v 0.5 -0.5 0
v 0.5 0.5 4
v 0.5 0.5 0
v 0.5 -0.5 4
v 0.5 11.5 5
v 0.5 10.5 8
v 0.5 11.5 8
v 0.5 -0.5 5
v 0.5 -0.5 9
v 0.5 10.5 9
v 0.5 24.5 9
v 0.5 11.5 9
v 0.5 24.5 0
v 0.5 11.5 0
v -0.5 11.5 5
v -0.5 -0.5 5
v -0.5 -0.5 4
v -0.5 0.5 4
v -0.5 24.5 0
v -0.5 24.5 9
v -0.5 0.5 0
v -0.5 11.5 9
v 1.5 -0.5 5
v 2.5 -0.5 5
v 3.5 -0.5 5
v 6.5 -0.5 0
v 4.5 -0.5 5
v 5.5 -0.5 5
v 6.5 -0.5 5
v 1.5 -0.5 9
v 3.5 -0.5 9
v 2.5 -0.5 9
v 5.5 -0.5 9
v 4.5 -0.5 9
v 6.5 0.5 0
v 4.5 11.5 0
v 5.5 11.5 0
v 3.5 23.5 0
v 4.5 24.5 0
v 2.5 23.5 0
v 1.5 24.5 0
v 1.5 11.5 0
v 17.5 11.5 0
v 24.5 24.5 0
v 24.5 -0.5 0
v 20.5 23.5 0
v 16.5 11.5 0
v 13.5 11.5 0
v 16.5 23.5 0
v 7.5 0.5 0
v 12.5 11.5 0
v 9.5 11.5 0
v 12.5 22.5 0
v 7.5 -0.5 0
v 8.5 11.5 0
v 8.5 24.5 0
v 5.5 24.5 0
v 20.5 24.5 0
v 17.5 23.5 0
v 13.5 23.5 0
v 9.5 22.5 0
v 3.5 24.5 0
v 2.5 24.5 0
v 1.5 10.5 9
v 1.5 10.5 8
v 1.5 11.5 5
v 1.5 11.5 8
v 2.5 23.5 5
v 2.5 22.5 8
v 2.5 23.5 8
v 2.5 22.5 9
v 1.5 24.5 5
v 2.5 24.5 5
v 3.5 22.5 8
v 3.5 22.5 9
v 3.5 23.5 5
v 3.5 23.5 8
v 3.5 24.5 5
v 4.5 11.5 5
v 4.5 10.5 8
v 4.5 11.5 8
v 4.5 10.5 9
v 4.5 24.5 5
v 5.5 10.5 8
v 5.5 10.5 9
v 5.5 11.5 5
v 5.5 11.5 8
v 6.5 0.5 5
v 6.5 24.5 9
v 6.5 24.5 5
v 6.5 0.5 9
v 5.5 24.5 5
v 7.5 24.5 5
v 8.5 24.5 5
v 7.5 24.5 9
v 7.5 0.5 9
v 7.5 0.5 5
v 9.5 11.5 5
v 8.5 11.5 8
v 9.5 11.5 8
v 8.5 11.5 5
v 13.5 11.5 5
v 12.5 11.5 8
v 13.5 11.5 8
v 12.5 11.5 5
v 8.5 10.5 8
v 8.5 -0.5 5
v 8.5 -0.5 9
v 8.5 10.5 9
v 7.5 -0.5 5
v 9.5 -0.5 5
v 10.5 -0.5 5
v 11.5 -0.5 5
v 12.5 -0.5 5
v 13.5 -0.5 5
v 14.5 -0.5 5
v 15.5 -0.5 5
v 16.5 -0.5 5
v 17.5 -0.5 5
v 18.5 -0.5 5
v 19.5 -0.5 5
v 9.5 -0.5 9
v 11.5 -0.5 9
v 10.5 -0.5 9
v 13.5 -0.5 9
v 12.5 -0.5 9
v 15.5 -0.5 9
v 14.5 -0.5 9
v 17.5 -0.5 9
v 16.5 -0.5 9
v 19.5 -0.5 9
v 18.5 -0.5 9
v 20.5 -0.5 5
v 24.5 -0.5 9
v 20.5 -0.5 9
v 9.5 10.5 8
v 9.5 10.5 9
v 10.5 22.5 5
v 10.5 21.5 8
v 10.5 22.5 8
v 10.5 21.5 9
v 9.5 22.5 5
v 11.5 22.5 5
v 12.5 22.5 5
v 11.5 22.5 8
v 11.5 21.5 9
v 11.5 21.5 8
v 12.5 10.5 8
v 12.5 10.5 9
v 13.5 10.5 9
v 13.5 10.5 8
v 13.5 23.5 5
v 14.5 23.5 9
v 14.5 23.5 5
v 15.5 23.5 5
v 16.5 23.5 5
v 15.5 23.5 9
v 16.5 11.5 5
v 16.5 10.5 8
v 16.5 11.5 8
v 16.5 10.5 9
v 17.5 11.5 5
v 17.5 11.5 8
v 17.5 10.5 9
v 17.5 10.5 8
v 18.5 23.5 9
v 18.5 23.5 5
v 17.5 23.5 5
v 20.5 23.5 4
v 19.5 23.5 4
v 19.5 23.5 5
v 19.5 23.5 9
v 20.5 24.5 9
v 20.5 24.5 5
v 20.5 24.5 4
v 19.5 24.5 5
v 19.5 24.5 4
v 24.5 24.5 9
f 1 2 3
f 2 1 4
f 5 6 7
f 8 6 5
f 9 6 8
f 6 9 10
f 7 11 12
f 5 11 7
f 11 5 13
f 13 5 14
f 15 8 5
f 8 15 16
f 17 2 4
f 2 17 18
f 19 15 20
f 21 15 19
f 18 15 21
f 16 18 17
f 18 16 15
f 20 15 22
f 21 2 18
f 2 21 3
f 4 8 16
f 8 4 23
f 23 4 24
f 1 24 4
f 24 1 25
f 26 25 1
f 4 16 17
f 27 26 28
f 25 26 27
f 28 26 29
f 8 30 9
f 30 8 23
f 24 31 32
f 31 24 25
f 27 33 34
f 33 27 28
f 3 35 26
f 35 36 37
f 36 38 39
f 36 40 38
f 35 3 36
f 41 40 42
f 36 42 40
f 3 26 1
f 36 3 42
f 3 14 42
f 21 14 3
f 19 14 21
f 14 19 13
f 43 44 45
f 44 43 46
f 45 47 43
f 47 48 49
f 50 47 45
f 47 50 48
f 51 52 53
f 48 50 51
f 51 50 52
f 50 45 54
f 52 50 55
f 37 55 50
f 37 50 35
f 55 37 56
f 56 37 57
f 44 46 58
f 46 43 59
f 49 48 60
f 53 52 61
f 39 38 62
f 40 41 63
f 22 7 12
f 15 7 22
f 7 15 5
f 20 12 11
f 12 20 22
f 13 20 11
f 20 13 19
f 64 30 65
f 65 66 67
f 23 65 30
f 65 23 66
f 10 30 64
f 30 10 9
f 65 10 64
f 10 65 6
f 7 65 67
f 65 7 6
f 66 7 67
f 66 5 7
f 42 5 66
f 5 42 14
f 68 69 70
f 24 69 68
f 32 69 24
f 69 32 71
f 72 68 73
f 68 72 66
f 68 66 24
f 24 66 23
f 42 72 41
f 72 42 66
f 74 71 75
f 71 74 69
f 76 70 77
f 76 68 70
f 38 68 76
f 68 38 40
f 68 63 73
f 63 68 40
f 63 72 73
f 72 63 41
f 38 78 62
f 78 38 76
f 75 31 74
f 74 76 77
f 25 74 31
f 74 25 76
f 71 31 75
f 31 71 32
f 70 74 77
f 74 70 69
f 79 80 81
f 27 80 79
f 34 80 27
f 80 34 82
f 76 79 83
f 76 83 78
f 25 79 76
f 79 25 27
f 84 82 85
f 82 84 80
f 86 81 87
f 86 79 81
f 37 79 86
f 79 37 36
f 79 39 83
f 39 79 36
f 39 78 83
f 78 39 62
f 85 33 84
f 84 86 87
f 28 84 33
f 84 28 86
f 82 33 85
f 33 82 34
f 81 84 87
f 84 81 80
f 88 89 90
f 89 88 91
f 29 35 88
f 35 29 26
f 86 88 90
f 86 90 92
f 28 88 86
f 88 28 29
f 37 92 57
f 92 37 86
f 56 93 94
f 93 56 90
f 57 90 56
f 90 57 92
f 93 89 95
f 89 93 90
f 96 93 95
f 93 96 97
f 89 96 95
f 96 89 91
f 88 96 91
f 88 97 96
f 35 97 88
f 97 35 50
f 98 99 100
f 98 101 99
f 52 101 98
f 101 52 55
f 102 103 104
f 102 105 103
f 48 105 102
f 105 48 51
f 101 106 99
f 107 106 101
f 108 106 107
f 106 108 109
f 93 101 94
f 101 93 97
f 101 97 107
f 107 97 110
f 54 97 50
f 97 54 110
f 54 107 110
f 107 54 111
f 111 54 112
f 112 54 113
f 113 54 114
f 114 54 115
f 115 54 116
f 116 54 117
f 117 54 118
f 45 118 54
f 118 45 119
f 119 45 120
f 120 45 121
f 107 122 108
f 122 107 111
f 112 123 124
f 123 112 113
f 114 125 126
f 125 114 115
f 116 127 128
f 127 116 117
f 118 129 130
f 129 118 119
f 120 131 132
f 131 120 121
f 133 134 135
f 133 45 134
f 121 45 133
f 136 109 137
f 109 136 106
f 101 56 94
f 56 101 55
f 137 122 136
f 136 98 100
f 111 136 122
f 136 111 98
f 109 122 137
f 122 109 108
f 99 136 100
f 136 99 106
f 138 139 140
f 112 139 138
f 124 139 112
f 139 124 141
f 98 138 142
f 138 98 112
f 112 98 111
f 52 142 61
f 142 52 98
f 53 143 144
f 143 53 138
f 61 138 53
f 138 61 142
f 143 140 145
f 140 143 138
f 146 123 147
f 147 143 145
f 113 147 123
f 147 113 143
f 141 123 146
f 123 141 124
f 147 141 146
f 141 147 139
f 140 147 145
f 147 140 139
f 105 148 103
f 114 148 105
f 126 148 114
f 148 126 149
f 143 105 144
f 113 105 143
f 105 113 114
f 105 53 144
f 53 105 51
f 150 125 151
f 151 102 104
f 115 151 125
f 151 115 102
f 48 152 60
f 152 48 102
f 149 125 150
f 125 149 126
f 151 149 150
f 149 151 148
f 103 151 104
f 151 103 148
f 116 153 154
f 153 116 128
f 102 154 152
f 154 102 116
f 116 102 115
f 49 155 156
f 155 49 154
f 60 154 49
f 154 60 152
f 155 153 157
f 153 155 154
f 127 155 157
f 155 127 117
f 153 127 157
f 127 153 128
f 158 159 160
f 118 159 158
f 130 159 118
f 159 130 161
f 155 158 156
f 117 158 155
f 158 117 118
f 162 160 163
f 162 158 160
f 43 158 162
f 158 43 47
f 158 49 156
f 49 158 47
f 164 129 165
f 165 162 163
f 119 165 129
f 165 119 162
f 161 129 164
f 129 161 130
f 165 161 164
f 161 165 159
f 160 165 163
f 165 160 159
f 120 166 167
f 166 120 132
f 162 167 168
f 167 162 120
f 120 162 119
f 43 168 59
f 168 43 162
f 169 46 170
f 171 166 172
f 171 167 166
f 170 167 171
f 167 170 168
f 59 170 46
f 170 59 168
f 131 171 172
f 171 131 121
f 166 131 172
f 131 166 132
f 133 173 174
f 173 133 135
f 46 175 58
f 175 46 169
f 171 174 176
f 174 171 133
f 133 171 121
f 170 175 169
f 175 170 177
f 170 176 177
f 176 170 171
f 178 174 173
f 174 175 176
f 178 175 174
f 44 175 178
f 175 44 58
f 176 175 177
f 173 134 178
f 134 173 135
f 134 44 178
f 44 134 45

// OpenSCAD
union() {
    translate([0, 0, 4.5]) color([1, 0, 0]) cube([1, 1, 1], center=true);
    translate([0, 1, 2.5]) cube([1, 1, 5], center=true);
    translate([0, 2, 2.5]) cube([1, 1, 5], center=true);
    translate([0, 3, 2.5]) cube([1, 1, 5], center=true);
    translate([0, 4, 2.5]) cube([1, 1, 5], center=true);
    translate([0, 5, 2.5]) cube([1, 1, 5], center=true);
    translate([0, 6, 2.5]) cube([1, 1, 5], center=true);
    translate([0, 7, 2.5]) cube([1, 1, 5], center=true);
    translate([0, 8, 2.5]) cube([1, 1, 5], center=true);
    translate([0, 9, 2.5]) cube([1, 1, 5], center=true);
    translate([0, 10, 2.5]) cube([1, 1, 5], center=true);
    translate([0, 11, 2.5]) cube([1, 1, 5], center=true);
    translate([0, 12, 4.5]) cube([1, 1, 9], center=true);
    translate([0, 13, 4.5]) cube([1, 1, 9], center=true);
    translate([0, 14, 4.5]) cube([1, 1, 9], center=true);
    translate([0, 15, 4.5]) cube([1, 1, 9], center=true);
    translate([0, 16, 4.5]) cube([1, 1, 9], center=true);
    translate([0, 17, 4.5]) cube([1, 1, 9], center=true);
    translate([0, 18, 4.5]) cube([1, 1, 9], center=true);
    translate([0, 19, 4.5]) cube([1, 1, 9], center=true);
    translate([0, 20, 4.5]) cube([1, 1, 9], center=true);
    translate([0, 21, 4.5]) cube([1, 1, 9], center=true);
    translate([0, 22, 4.5]) cube([1, 1, 9], center=true);
    translate([0, 23, 4.5]) cube([1, 1, 9], center=true);
    translate([0, 24, 4.5]) cube([1, 1, 9], center=true);
    translate([1, 0, 4.5]) cube([1, 1, 9], center=true);
    translate([1, 1, 4.5]) cube([1, 1, 9], center=true);
    translate([1, 2, 4.5]) cube([1, 1, 9], center=true);
    translate([1, 3, 4.5]) cube([1, 1, 9], center=true);
    translate([1, 4, 4.5]) cube([1, 1, 9], center=true);
    translate([1, 5, 4.5]) cube([1, 1, 9], center=true);
    translate([1, 6, 4.5]) cube([1, 1, 9], center=true);
    translate([1, 7, 4.5]) cube([1, 1, 9], center=true);
    translate([1, 8, 4.5]) cube([1, 1, 9], center=true);
    translate([1, 9, 4.5]) cube([1, 1, 9], center=true);
    translate([1, 10, 4.5]) cube([1, 1, 9], center=true);
    translate([1, 11, 4.0]) cube([1, 1, 8], center=true);
    translate([2, 0, 2.5]) cube([1, 1, 5], center=true);
    translate([2, 1, 2.5]) cube([1, 1, 5], center=true);
    translate([2, 2, 2.5]) cube([1, 1, 5], center=true);
    translate([2, 3, 2.5]) cube([1, 1, 5], center=true);
    translate([2, 4, 2.5]) cube([1, 1, 5], center=true);
    translate([2, 5, 2.5]) cube([1, 1, 5], center=true);
    translate([2, 6, 2.5]) cube([1, 1, 5], center=true);
    translate([2, 7, 2.5]) cube([1, 1, 5], center=true);
    translate([2, 8, 2.5]) cube([1, 1, 5], center=true);
    translate([2, 9, 2.5]) cube([1, 1, 5], center=true);
    translate([2, 10, 2.5]) cube([1, 1, 5], center=true);
    translate([2, 11, 2.5]) cube([1, 1, 5], center=true);
    translate([2, 12, 2.5]) cube([1, 1, 5], center=true);
    translate([2, 13, 2.5]) cube([1, 1, 5], center=true);
    translate([2, 14, 2.5]) cube([1, 1, 5], center=true);
    translate([2, 15, 2.5]) cube([1, 1, 5], center=true);
    translate([2, 16, 2.5]) cube([1, 1, 5], center=true);
    translate([2, 17, 2.5]) cube([1, 1, 5], center=true);
    translate([2, 18, 2.5]) cube([1, 1, 5], center=true);
    translate([2, 19, 2.5]) cube([1, 1, 5], center=true);
    translate([2, 20, 2.5]) cube([1, 1, 5], center=true);
    translate([2, 21, 2.5]) cube([1, 1, 5], center=true);
    translate([2, 22, 2.5]) cube([1, 1, 5], center=true);
    translate([2, 23, 2.5]) cube([1, 1, 5], center=true);
    translate([2, 24, 2.5]) cube([1, 1, 5], center=true);
    translate([3, 0, 4.5]) cube([1, 1, 9], center=true);
    translate([3, 1, 4.5]) cube([1, 1, 9], center=true);
    translate([3, 2, 4.5]) cube([1, 1, 9], center=true);
    translate([3, 3, 4.5]) cube([1, 1, 9], center=true);
    translate([3, 4, 4.5]) cube([1, 1, 9], center=true);
    translate([3, 5, 4.5]) cube([1, 1, 9], center=true);
    translate([3, 6, 4.5]) cube([1, 1, 9], center=true);
    translate([3, 7, 4.5]) cube([1, 1, 9], center=true);
    translate([3, 8, 4.5]) cube([1, 1, 9], center=true);
    translate([3, 9, 4.5]) cube([1, 1, 9], center=true);
    translate([3, 10, 4.5]) cube([1, 1, 9], center=true);
    translate([3, 11, 4.5]) cube([1, 1, 9], center=true);
    translate([3, 12, 4.5]) cube([1, 1, 9], center=true);
    translate([3, 13, 4.5]) cube([1, 1, 9], center=true);
    translate([3, 14, 4.5]) cube([1, 1, 9], center=true);
    translate([3, 15, 4.5]) cube([1, 1, 9], center=true);
    translate([3, 16, 4.5]) cube([1, 1, 9], center=true);
    translate([3, 17, 4.5]) cube([1, 1, 9], center=true);
    translate([3, 18, 4.5]) cube([1, 1, 9], center=true);
    translate([3, 19, 4.5]) cube([1, 1, 9], center=true);
    translate([3, 20, 4.5]) cube([1, 1, 9], center=true);
    translate([3, 21, 4.5]) cube([1, 1, 9], center=true);
    translate([3, 22, 4.5]) cube([1, 1, 9], center=true);
    translate([3, 23, 4.0]) cube([1, 1, 8], center=true);
    translate([4, 0, 2.5]) cube([1, 1, 5], center=true);
    translate([4, 1, 2.5]) cube([1, 1, 5], center=true);
    translate([4, 2, 2.5]) cube([1, 1, 5], center=true);
    translate([4, 3, 2.5]) cube([1, 1, 5], center=true);
    translate([4, 4, 2.5]) cube([1, 1, 5], center=true);
    translate([4, 5, 2.5]) cube([1, 1, 5], center=true);
    translate([4, 6, 2.5]) cube([1, 1, 5], center=true);
    translate([4, 7, 2.5]) cube([1, 1, 5], center=true);
    translate([4, 8, 2.5]) cube([1, 1, 5], center=true);
    translate([4, 9, 2.5]) cube([1, 1, 5], center=true);
    translate([4, 10, 2.5]) cube([1, 1, 5], center=true);
    translate([4, 11, 2.5]) cube([1, 1, 5], center=true);
    translate([4, 12, 2.5]) cube([1, 1, 5], center=true);
    translate([4, 13, 2.5]) cube([1, 1, 5], center=true);
    translate([4, 14, 2.5]) cube([1, 1, 5], center=true);
    translate([4, 15, 2.5]) cube([1, 1, 5], center=true);
    translate([4, 16, 2.5]) cube([1, 1, 5], center=true);
    translate([4, 17, 2.5]) cube([1, 1, 5], center=true);
    translate([4, 18, 2.5]) cube([1, 1, 5], center=true);
    translate([4, 19, 2.5]) cube([1, 1, 5], center=true);
    translate([4, 20, 2.5]) cube([1, 1, 5], center=true);
    translate([4, 21, 2.5]) cube([1, 1, 5], center=true);
    translate([4, 22, 2.5]) cube([1, 1, 5], center=true);
    translate([4, 23, 2.5]) cube([1, 1, 5], center=true);
    translate([4, 24, 2.5]) cube([1, 1, 5], center=true);
    translate([5, 0, 4.5]) cube([1, 1, 9], center=true);
    translate([5, 1, 4.5]) cube([1, 1, 9], center=true);
    translate([5, 2, 4.5]) cube([1, 1, 9], center=true);
    translate([5, 3, 4.5]) cube([1, 1, 9], center=true);
    translate([5, 4, 4.5]) cube([1, 1, 9], center=true);
    translate([5, 5, 4.5]) cube([1, 1, 9], center=true);
    translate([5, 6, 4.5]) cube([1, 1, 9], center=true);
    translate([5, 7, 4.5]) cube([1, 1, 9], center=true);
    translate([5, 8, 4.5]) cube([1, 1, 9], center=true);
    translate([5, 9, 4.5]) cube([1, 1, 9], center=true);
    translate([5, 10, 4.5]) cube([1, 1, 9], center=true);
    translate([5, 11, 4.0]) cube([1, 1, 8], center=true);
    translate([6, 0, 2.5]) cube([1, 1, 5], center=true);
    translate([6, 1, 2.5]) cube([1, 1, 5], center=true);
    translate([6, 2, 2.5]) cube([1, 1, 5], center=true);
    translate([6, 3, 2.5]) cube([1, 1, 5], center=true);
    translate([6, 4, 2.5]) cube([1, 1, 5], center=true);
    translate([6, 5, 2.5]) cube([1, 1, 5], center=true);
    translate([6, 6, 2.5]) cube([1, 1, 5], center=true);
    translate([6, 7, 2.5]) cube([1, 1, 5], center=true);
    translate([6, 8, 2.5]) cube([1, 1, 5], center=true);
    translate([6, 9, 2.5]) cube([1, 1, 5], center=true);
    translate([6, 10, 2.5]) cube([1, 1, 5], center=true);
    translate([6, 11, 2.5]) cube([1, 1, 5], center=true);
    translate([6, 12, 2.5]) cube([1, 1, 5], center=true);
    translate([6, 13, 2.5]) cube([1, 1, 5], center=true);
    translate([6, 14, 2.5]) cube([1, 1, 5], center=true);
    translate([6, 15, 2.5]) cube([1, 1, 5], center=true);
    translate([6, 16, 2.5]) cube([1, 1, 5], center=true);
    translate([6, 17, 2.5]) cube([1, 1, 5], center=true);
    translate([6, 18, 2.5]) cube([1, 1, 5], center=true);
    translate([6, 19, 2.5]) cube([1, 1, 5], center=true);
    translate([6, 20, 2.5]) cube([1, 1, 5], center=true);
    translate([6, 21, 2.5]) cube([1, 1, 5], center=true);
    translate([6, 22, 2.5]) cube([1, 1, 5], center=true);
    translate([6, 23, 2.5]) cube([1, 1, 5], center=true);
    translate([6, 24, 2.5]) cube([1, 1, 5], center=true);
    translate([7, 1, 4.5]) cube([1, 1, 9], center=true);
    translate([7, 2, 4.5]) cube([1, 1, 9], center=true);
    translate([7, 3, 4.5]) cube([1, 1, 9], center=true);
    translate([7, 4, 4.5]) cube([1, 1, 9], center=true);
    translate([7, 5, 4.5]) cube([1, 1, 9], center=true);
    translate([7, 6, 4.5]) cube([1, 1, 9], center=true);
    translate([7, 7, 4.5]) cube([1, 1, 9], center=true);
    translate([7, 8, 4.5]) cube([1, 1, 9], center=true);
    translate([7, 9, 4.5]) cube([1, 1, 9], center=true);
    translate([7, 10, 4.5]) cube([1, 1, 9], center=true);
    translate([7, 11, 4.5]) cube([1, 1, 9], center=true);
    translate([7, 12, 4.5]) cube([1, 1, 9], center=true);
    translate([7, 13, 4.5]) cube([1, 1, 9], center=true);
    translate([7, 14, 4.5]) cube([1, 1, 9], center=true);
    translate([7, 15, 4.5]) cube([1, 1, 9], center=true);
    translate([7, 16, 4.5]) cube([1, 1, 9], center=true);
    translate([7, 17, 4.5]) cube([1, 1, 9], center=true);
    translate([7, 18, 4.5]) cube([1, 1, 9], center=true);
    translate([7, 19, 4.5]) cube([1, 1, 9], center=true);
    translate([7, 20, 4.5]) cube([1, 1, 9], center=true);
    translate([7, 21, 4.5]) cube([1, 1, 9], center=true);
    translate([7, 22, 4.5]) cube([1, 1, 9], center=true);
    translate([7, 23, 4.5]) cube([1, 1, 9], center=true);
    translate([7, 24, 4.5]) cube([1, 1, 9], center=true);
    translate([8, 0, 2.5]) cube([1, 1, 5], center=true);
    translate([8, 1, 2.5]) cube([1, 1, 5], center=true);
    translate([8, 2, 2.5]) cube([1, 1, 5], center=true);
    translate([8, 3, 2.5]) cube([1, 1, 5], center=true);
    translate([8, 4, 2.5]) cube([1, 1, 5], center=true);
    translate([8, 5, 2.5]) cube([1, 1, 5], center=true);
    translate([8, 6, 2.5]) cube([1, 1, 5], center=true);
    translate([8, 7, 2.5]) cube([1, 1, 5], center=true);
    translate([8, 8, 2.5]) cube([1, 1, 5], center=true);
    translate([8, 9, 2.5]) cube([1, 1, 5], center=true);
    translate([8, 10, 2.5]) cube([1, 1, 5], center=true);
    translate([8, 11, 2.5]) cube([1, 1, 5], center=true);
    translate([8, 12, 2.5]) cube([1, 1, 5], center=true);
    translate([8, 13, 2.5]) cube([1, 1, 5], center=true);
    translate([8, 14, 2.5]) cube([1, 1, 5], center=true);
    translate([8, 15, 2.5]) cube([1, 1, 5], center=true);
    translate([8, 16, 2.5]) cube([1, 1, 5], center=true);
    translate([8, 17, 2.5]) cube([1, 1, 5], center=true);
    translate([8, 18, 2.5]) cube([1, 1, 5], center=true);
    translate([8, 19, 2.5]) cube([1, 1, 5], center=true);
    translate([8, 20, 2.5]) cube([1, 1, 5], center=true);
    translate([8, 21, 2.5]) cube([1, 1, 5], center=true);
    translate([8, 22, 2.5]) cube([1, 1, 5], center=true);
    translate([8, 23, 2.5]) cube([1, 1, 5], center=true);
    translate([8, 24, 2.5]) cube([1, 1, 5], center=true);
    translate([9, 0, 4.5]) cube([1, 1, 9], center=true);
    translate([9, 1, 4.5]) cube([1, 1, 9], center=true);
    translate([9, 2, 4.5]) cube([1, 1, 9], center=true);
    translate([9, 3, 4.5]) cube([1, 1, 9], center=true);
    translate([9, 4, 4.5]) cube([1, 1, 9], center=true);
    translate([9, 5, 4.5]) cube([1, 1, 9], center=true);
    translate([9, 6, 4.5]) cube([1, 1, 9], center=true);
    translate([9, 7, 4.5]) cube([1, 1, 9], center=true);
    translate([9, 8, 4.5]) cube([1, 1, 9], center=true);
    translate([9, 9, 4.5]) cube([1, 1, 9], center=true);
    translate([9, 10, 4.5]) cube([1, 1, 9], center=true);
    translate([9, 11, 4.0]) cube([1, 1, 8], center=true);
    translate([10, 0, 2.5]) cube([1, 1, 5], center=true);
    translate([10, 1, 2.5]) cube([1, 1, 5], center=true);
    translate([10, 2, 2.5]) cube([1, 1, 5], center=true);
    translate([10, 3, 2.5]) cube([1, 1, 5], center=true);
    translate([10, 4, 2.5]) cube([1, 1, 5], center=true);
    translate([10, 5, 2.5]) cube([1, 1, 5], center=true);
    translate([10, 6, 2.5]) cube([1, 1, 5], center=true);
    translate([10, 7, 2.5]) cube([1, 1, 5], center=true);
    translate([10, 8, 2.5]) cube([1, 1, 5], center=true);
    translate([10, 9, 2.5]) cube([1, 1, 5], center=true);
    translate([10, 10, 2.5]) cube([1, 1, 5], center=true);
    translate([10, 11, 2.5]) cube([1, 1, 5], center=true);
    translate([10, 12, 2.5]) cube([1, 1, 5], center=true);
    translate([10, 13, 2.5]) cube([1, 1, 5], center=true);
    translate([10, 14, 2.5]) cube([1, 1, 5], center=true);
    translate([10, 15, 2.5]) cube([1, 1, 5], center=true);
    translate([10, 16, 2.5]) cube([1, 1, 5], center=true);
    translate([10, 17, 2.5]) cube([1, 1, 5], center=true);
    translate([10, 18, 2.5]) cube([1, 1, 5], center=true);
    translate([10, 19, 2.5]) cube([1, 1, 5], center=true);
    translate([10, 20, 2.5]) cube([1, 1, 5], center=true);
    translate([10, 21, 2.5]) cube([1, 1, 5], center=true);
    translate([10, 22, 2.5]) cube([1, 1, 5], center=true);
    translate([11, 0, 4.5]) cube([1, 1, 9], center=true);
    translate([11, 1, 4.5]) cube([1, 1, 9], center=true);
    translate([11, 2, 4.5]) cube([1, 1, 9], center=true);
    translate([11, 3, 4.5]) cube([1, 1, 9], center=true);
    translate([11, 4, 4.5]) cube([1, 1, 9], center=true);
    translate([11, 5, 4.5]) cube([1, 1, 9], center=true);
    translate([11, 6, 4.5]) cube([1, 1, 9], center=true);
    translate([11, 7, 4.5]) cube([1, 1, 9], center=true);
    translate([11, 8, 4.5]) cube([1, 1, 9], center=true);
    translate([11, 9, 4.5]) cube([1, 1, 9], center=true);
    translate([11, 10, 4.5]) cube([1, 1, 9], center=true);
    translate([11, 11, 4.5]) cube([1, 1, 9], center=true);
    translate([11, 12, 4.5]) cube([1, 1, 9], center=true);
    translate([11, 13, 4.5]) cube([1, 1, 9], center=true);
    translate([11, 14, 4.5]) cube([1, 1, 9], center=true);
    translate([11, 15, 4.5]) cube([1, 1, 9], center=true);
    translate([11, 16, 4.5]) cube([1, 1, 9], center=true);
    translate([11, 17, 4.5]) cube([1, 1, 9], center=true);
    translate([11, 18, 4.5]) cube([1, 1, 9], center=true);
    translate([11, 19, 4.5]) cube([1, 1, 9], center=true);
    translate([11, 20, 4.5]) cube([1, 1, 9], center=true);
    translate([11, 21, 4.5]) cube([1, 1, 9], center=true);
    translate([11, 22, 4.0]) cube([1, 1, 8], center=true);
    translate([12, 0, 2.5]) cube([1, 1, 5], center=true);
    translate([12, 1, 2.5]) cube([1, 1, 5], center=true);
    translate([12, 2, 2.5]) cube([1, 1, 5], center=true);
    translate([12, 3, 2.5]) cube([1, 1, 5], center=true);
    translate([12, 4, 2.5]) cube([1, 1, 5], center=true);
    translate([12, 5, 2.5]) cube([1, 1, 5], center=true);
    translate([12, 6, 2.5]) cube([1, 1, 5], center=true);
    translate([12, 7, 2.5]) cube([1, 1, 5], center=true);
    translate([12, 8, 2.5]) cube([1, 1, 5], center=true);
    translate([12, 9, 2.5]) cube([1, 1, 5], center=true);
    translate([12, 10, 2.5]) cube([1, 1, 5], center=true);
    translate([12, 11, 2.5]) cube([1, 1, 5], center=true);
    translate([12, 12, 2.5]) cube([1, 1, 5], center=true);
    translate([12, 13, 2.5]) cube([1, 1, 5], center=true);
    translate([12, 14, 2.5]) cube([1, 1, 5], center=true);
    translate([12, 15, 2.5]) cube([1, 1, 5], center=true);
    translate([12, 16, 2.5]) cube([1, 1, 5], center=true);
    translate([12, 17, 2.5]) cube([1, 1, 5], center=true);
    translate([12, 18, 2.5]) cube([1, 1, 5], center=true);
    translate([12, 19, 2.5]) cube([1, 1, 5], center=true);
    translate([12, 20, 2.5]) cube([1, 1, 5], center=true);
    translate([12, 21, 2.5]) cube([1, 1, 5], center=true);
    translate([12, 22, 2.5]) cube([1, 1, 5], center=true);
    translate([13, 0, 4.5]) cube([1, 1, 9], center=true);
    translate([13, 1, 4.5]) cube([1, 1, 9], center=true);
    translate([13, 2, 4.5]) cube([1, 1, 9], center=true);
    translate([13, 3, 4.5]) cube([1, 1, 9], center=true);
    translate([13, 4, 4.5]) cube([1, 1, 9], center=true);
    translate([13, 5, 4.5]) cube([1, 1, 9], center=true);
    translate([13, 6, 4.5]) cube([1, 1, 9], center=true);
    translate([13, 7, 4.5]) cube([1, 1, 9], center=true);
    translate([13, 8, 4.5]) cube([1, 1, 9], center=true);
    translate([13, 9, 4.5]) cube([1, 1, 9], center=true);
    translate([13, 10, 4.5]) cube([1, 1, 9], center=true);
    translate([13, 11, 4.0]) cube([1, 1, 8], center=true);
    translate([14, 0, 2.5]) cube([1, 1, 5], center=true);
    translate([14, 1, 2.5]) cube([1, 1, 5], center=true);
    translate([14, 2, 2.5]) cube([1, 1, 5], center=true);
    translate([14, 3, 2.5]) cube([1, 1, 5], center=true);
    translate([14, 4, 2.5]) cube([1, 1, 5], center=true);
    translate([14, 5, 2.5]) cube([1, 1, 5], center=true);
    translate([14, 6, 2.5]) cube([1, 1, 5], center=true);
    translate([14, 7, 2.5]) cube([1, 1, 5], center=true);
    translate([14, 8, 2.5]) cube([1, 1, 5], center=true);
    translate([14, 9, 2.5]) cube([1, 1, 5], center=true);
    translate([14, 10, 2.5]) cube([1, 1, 5], center=true);
    translate([14, 11, 2.5]) cube([1, 1, 5], center=true);
    translate([14, 12, 2.5]) cube([1, 1, 5], center=true);
    translate([14, 13, 2.5]) cube([1, 1, 5], center=true);
    translate([14, 14, 2.5]) cube([1, 1, 5], center=true);
    translate([14, 15, 2.5]) cube([1, 1, 5], center=true);
    translate([14, 16, 2.5]) cube([1, 1, 5], center=true);
    translate([14, 17, 2.5]) cube([1, 1, 5], center=true);
    translate([14, 18, 2.5]) cube([1, 1, 5], center=true);
    translate([14, 19, 2.5]) cube([1, 1, 5], center=true);
    translate([14, 20, 2.5]) cube([1, 1, 5], center=true);
    translate([14, 21, 2.5]) cube([1, 1, 5], center=true);
    translate([14, 22, 2.5]) cube([1, 1, 5], center=true);
    translate([14, 23, 2.5]) cube([1, 1, 5], center=true);
    translate([15, 0, 4.5]) cube([1, 1, 9], center=true);
    translate([15, 1, 4.5]) cube([1, 1, 9], center=true);
    translate([15, 2, 4.5]) cube([1, 1, 9], center=true);
    translate([15, 3, 4.5]) cube([1, 1, 9], center=true);
    translate([15, 4, 4.5]) cube([1, 1, 9], center=true);
    translate([15, 5, 4.5]) cube([1, 1, 9], center=true);
    translate([15, 6, 4.5]) cube([1, 1, 9], center=true);
    translate([15, 7, 4.5]) cube([1, 1, 9], center=true);
    translate([15, 8, 4.5]) cube([1, 1, 9], center=true);
    translate([15, 9, 4.5]) cube([1, 1, 9], center=true);
    translate([15, 10, 4.5]) cube([1, 1, 9], center=true);
    translate([15, 11, 4.5]) cube([1, 1, 9], center=true);
    translate([15, 12, 4.5]) cube([1, 1, 9], center=true);
    translate([15, 13, 4.5]) cube([1, 1, 9], center=true);
    translate([15, 14, 4.5]) cube([1, 1, 9], center=true);
    translate([15, 15, 4.5]) cube([1, 1, 9], center=true);
    translate([15, 16, 4.5]) cube([1, 1, 9], center=true);
    translate([15, 17, 4.5]) cube([1, 1, 9], center=true);
    translate([15, 18, 4.5]) cube([1, 1, 9], center=true);
    translate([15, 19, 4.5]) cube([1, 1, 9], center=true);
    translate([15, 20, 4.5]) cube([1, 1, 9], center=true);
    translate([15, 21, 4.5]) cube([1, 1, 9], center=true);
    translate([15, 22, 4.5]) cube([1, 1, 9], center=true);
    translate([15, 23, 4.5]) cube([1, 1, 9], center=true);
    translate([16, 0, 2.5]) cube([1, 1, 5], center=true);
    translate([16, 1, 2.5]) cube([1, 1, 5], center=true);
    translate([16, 2, 2.5]) cube([1, 1, 5], center=true);
    translate([16, 3, 2.5]) cube([1, 1, 5], center=true);
    translate([16, 4, 2.5]) cube([1, 1, 5], center=true);
    translate([16, 5, 2.5]) cube([1, 1, 5], center=true);
    translate([16, 6, 2.5]) cube([1, 1, 5], center=true);
    translate([16, 7, 2.5]) cube([1, 1, 5], center=true);
    translate([16, 8, 2.5]) cube([1, 1, 5], center=true);
    translate([16, 9, 2.5]) cube([1, 1, 5], center=true);
    translate([16, 10, 2.5]) cube([1, 1, 5], center=true);
    translate([16, 11, 2.5]) cube([1, 1, 5], center=true);
    translate([16, 12, 2.5]) cube([1, 1, 5], center=true);
    translate([16, 13, 2.5]) cube([1, 1, 5], center=true);
    translate([16, 14, 2.5]) cube([1, 1, 5], center=true);
    translate([16, 15, 2.5]) cube([1, 1, 5], center=true);
    translate([16, 16, 2.5]) cube([1, 1, 5], center=true);
    translate([16, 17, 2.5]) cube([1, 1, 5], center=true);
    translate([16, 18, 2.5]) cube([1, 1, 5], center=true);
    translate([16, 19, 2.5]) cube([1, 1, 5], center=true);
    translate([16, 20, 2.5]) cube([1, 1, 5], center=true);
    translate([16, 21, 2.5]) cube([1, 1, 5], center=true);
    translate([16, 22, 2.5]) cube([1, 1, 5], center=true);
    translate([16, 23, 2.5]) cube([1, 1, 5], center=true);
    translate([17, 0, 4.5]) cube([1, 1, 9], center=true);
    translate([17, 1, 4.5]) cube([1, 1, 9], center=true);
    translate([17, 2, 4.5]) cube([1, 1, 9], center=true);
    translate([17, 3, 4.5]) cube([1, 1, 9], center=true);
    translate([17, 4, 4.5]) cube([1, 1, 9], center=true);
    translate([17, 5, 4.5]) cube([1, 1, 9], center=true);
    translate([17, 6, 4.5]) cube([1, 1, 9], center=true);
    translate([17, 7, 4.5]) cube([1, 1, 9], center=true);
    translate([17, 8, 4.5]) cube([1, 1, 9], center=true);
    translate([17, 9, 4.5]) cube([1, 1, 9], center=true);
    translate([17, 10, 4.5]) cube([1, 1, 9], center=true);
    translate([17, 11, 4.0]) cube([1, 1, 8], center=true);
    translate([18, 0, 2.5]) cube([1, 1, 5], center=true);
    translate([18, 1, 2.5]) cube([1, 1, 5], center=true);
    translate([18, 2, 2.5]) cube([1, 1, 5], center=true);
    translate([18, 3, 2.5]) cube([1, 1, 5], center=true);
    translate([18, 4, 2.5]) cube([1, 1, 5], center=true);
    translate([18, 5, 2.5]) cube([1, 1, 5], center=true);
    translate([18, 6, 2.5]) cube([1, 1, 5], center=true);
    translate([18, 7, 2.5]) cube([1, 1, 5], center=true);
    translate([18, 8, 2.5]) cube([1, 1, 5], center=true);
    translate([18, 9, 2.5]) cube([1, 1, 5], center=true);
    translate([18, 10, 2.5]) cube([1, 1, 5], center=true);
    translate([18, 11, 2.5]) cube([1, 1, 5], center=true);
    translate([18, 12, 2.5]) cube([1, 1, 5], center=true);
    translate([18, 13, 2.5]) cube([1, 1, 5], center=true);
    translate([18, 14, 2.5]) cube([1, 1, 5], center=true);
    translate([18, 15, 2.5]) cube([1, 1, 5], center=true);
    translate([18, 16, 2.5]) cube([1, 1, 5], center=true);
    translate([18, 17, 2.5]) cube([1, 1, 5], center=true);
    translate([18, 18, 2.5]) cube([1, 1, 5], center=true);
    translate([18, 19, 2.5]) cube([1, 1, 5], center=true);
    translate([18, 20, 2.5]) cube([1, 1, 5], center=true);
    translate([18, 21, 2.5]) cube([1, 1, 5], center=true);
    translate([18, 22, 2.5]) cube([1, 1, 5], center=true);
    translate([18, 23, 2.5]) cube([1, 1, 5], center=true);
    translate([19, 0, 4.5]) cube([1, 1, 9], center=true);
    translate([19, 1, 4.5]) cube([1, 1, 9], center=true);
    translate([19, 2, 4.5]) cube([1, 1, 9], center=true);
    translate([19, 3, 4.5]) cube([1, 1, 9], center=true);
    translate([19, 4, 4.5]) cube([1, 1, 9], center=true);
    translate([19, 5, 4.5]) cube([1, 1, 9], center=true);
    translate([19, 6, 4.5]) cube([1, 1, 9], center=true);
    translate([19, 7, 4.5]) cube([1, 1, 9], center=true);
    translate([19, 8, 4.5]) cube([1, 1, 9], center=true);
    translate([19, 9, 4.5]) cube([1, 1, 9], center=true);
    translate([19, 10, 4.5]) cube([1, 1, 9], center=true);
    translate([19, 11, 4.5]) cube([1, 1, 9], center=true);
    translate([19, 12, 4.5]) cube([1, 1, 9], center=true);
    translate([19, 13, 4.5]) cube([1, 1, 9], center=true);
    translate([19, 14, 4.5]) cube([1, 1, 9], center=true);
    translate([19, 15, 4.5]) cube([1, 1, 9], center=true);
    translate([19, 16, 4.5]) cube([1, 1, 9], center=true);
    translate([19, 17, 4.5]) cube([1, 1, 9], center=true);
    translate([19, 18, 4.5]) cube([1, 1, 9], center=true);
    translate([19, 19, 4.5]) cube([1, 1, 9], center=true);
    translate([19, 20, 4.5]) cube([1, 1, 9], center=true);
    translate([19, 21, 4.5]) cube([1, 1, 9], center=true);
    translate([19, 22, 4.5]) cube([1, 1, 9], center=true);
    translate([19, 23, 4.5]) cube([1, 1, 9], center=true);
    translate([20, 0, 2.5]) cube([1, 1, 5], center=true);
    translate([20, 1, 2.5]) cube([1, 1, 5], center=true);
    translate([20, 2, 2.5]) cube([1, 1, 5], center=true);
    translate([20, 3, 2.5]) cube([1, 1, 5], center=true);
    translate([20, 4, 2.5]) cube([1, 1, 5], center=true);
    translate([20, 5, 2.5]) cube([1, 1, 5], center=true);
    translate([20, 6, 2.5]) cube([1, 1, 5], center=true);
    translate([20, 7, 2.5]) cube([1, 1, 5], center=true);
    translate([20, 8, 2.5]) cube([1, 1, 5], center=true);
    translate([20, 9, 2.5]) cube([1, 1, 5], center=true);
    translate([20, 10, 2.5]) cube([1, 1, 5], center=true);
    translate([20, 11, 2.5]) cube([1, 1, 5], center=true);
    translate([20, 12, 2.5]) cube([1, 1, 5], center=true);
    translate([20, 13, 2.5]) cube([1, 1, 5], center=true);
    translate([20, 14, 2.5]) cube([1, 1, 5], center=true);
    translate([20, 15, 2.5]) cube([1, 1, 5], center=true);
    translate([20, 16, 2.5]) cube([1, 1, 5], center=true);
    translate([20, 17, 2.5]) cube([1, 1, 5], center=true);
    translate([20, 18, 2.5]) cube([1, 1, 5], center=true);
    translate([20, 19, 2.5]) cube([1, 1, 5], center=true);
    translate([20, 20, 2.5]) cube([1, 1, 5], center=true);
    translate([20, 21, 2.5]) cube([1, 1, 5], center=true);
    translate([20, 22, 2.5]) cube([1, 1, 5], center=true);
    translate([20, 23, 2.5]) cube([1, 1, 5], center=true);
    translate([20, 24, 4.5]) color([0, 0, 1]) cube([1, 1, 1], center=true);
    translate([21, 0, 4.5]) cube([1, 1, 9], center=true);
    translate([21, 1, 4.5]) cube([1, 1, 9], center=true);
    translate([21, 2, 4.5]) cube([1, 1, 9], center=true);
    translate([21, 3, 4.5]) cube([1, 1, 9], center=true);
    translate([21, 4, 4.5]) cube([1, 1, 9], center=true);
    translate([21, 5, 4.5]) cube([1, 1, 9], center=true);
    translate([21, 6, 4.5]) cube([1, 1, 9], center=true);
    translate([21, 7, 4.5]) cube([1, 1, 9], center=true);
    translate([21, 8, 4.5]) cube([1, 1, 9], center=true);
    translate([21, 9, 4.5]) cube([1, 1, 9], center=true);
    translate([21, 10, 4.5]) cube([1, 1, 9], center=true);
    translate([21, 11, 4.5]) cube([1, 1, 9], center=true);
    translate([21, 12, 4.5]) cube([1, 1, 9], center=true);
    translate([21, 13, 4.5]) cube([1, 1, 9], center=true);
    translate([21, 14, 4.5]) cube([1, 1, 9], center=true);
    translate([21, 15, 4.5]) cube([1, 1, 9], center=true);
    translate([21, 16, 4.5]) cube([1, 1, 9], center=true);
    translate([21, 17, 4.5]) cube([1, 1, 9], center=true);
    translate([21, 18, 4.5]) cube([1, 1, 9], center=true);
    translate([21, 19, 4.5]) cube([1, 1, 9], center=true);
    translate([21, 20, 4.5]) cube([1, 1, 9], center=true);
    translate([21, 21, 4.5]) cube([1, 1, 9], center=true);
    translate([21, 22, 4.5]) cube([1, 1, 9], center=true);
    translate([21, 23, 4.5]) cube([1, 1, 9], center=true);
    translate([21, 24, 4.5]) cube([1, 1, 9], center=true);
    translate([22, 0, 4.5]) cube([1, 1, 9], center=true);
    translate([22, 1, 4.5]) cube([1, 1, 9], center=true);
    translate([22, 2, 4.5]) cube([1, 1, 9], center=true);
    translate([22, 3, 4.5]) cube([1, 1, 9], center=true);
    translate([22, 4, 4.5]) cube([1, 1, 9], center=true);
    translate([22, 5, 4.5]) cube([1, 1, 9], center=true);
    translate([22, 6, 4.5]) cube([1, 1, 9], center=true);
    translate([22, 7, 4.5]) cube([1, 1, 9], center=true);
    translate([22, 8, 4.5]) cube([1, 1, 9], center=true);
    translate([22, 9, 4.5]) cube([1, 1, 9], center=true);
    translate([22, 10, 4.5]) cube([1, 1, 9], center=true);
    translate([22, 11, 4.5]) cube([1, 1, 9], center=true);
    translate([22, 12, 4.5]) cube([1, 1, 9], center=true);
    translate([22, 13, 4.5]) cube([1, 1, 9], center=true);
    translate([22, 14, 4.5]) cube([1, 1, 9], center=true);
    translate([22, 15, 4.5]) cube([1, 1, 9], center=true);
    translate([22, 16, 4.5]) cube([1, 1, 9], center=true);
    translate([22, 17, 4.5]) cube([1, 1, 9], center=true);
    translate([22, 18, 4.5]) cube([1, 1, 9], center=true);
    translate([22, 19, 4.5]) cube([1, 1, 9], center=true);
    translate([22, 20, 4.5]) cube([1, 1, 9], center=true);
    translate([22, 21, 4.5]) cube([1, 1, 9], center=true);
    translate([22, 22, 4.5]) cube([1, 1, 9], center=true);
    translate([22, 23, 4.5]) cube([1, 1, 9], center=true);
    translate([22, 24, 4.5]) cube([1, 1, 9], center=true);
    translate([23, 0, 4.5]) cube([1, 1, 9], center=true);
    translate([23, 1, 4.5]) cube([1, 1, 9], center=true);
    translate([23, 2, 4.5]) cube([1, 1, 9], center=true);
    translate([23, 3, 4.5]) cube([1, 1, 9], center=true);
    translate([23, 4, 4.5]) cube([1, 1, 9], center=true);
    translate([23, 5, 4.5]) cube([1, 1, 9], center=true);
    translate([23, 6, 4.5]) cube([1, 1, 9], center=true);
    translate([23, 7, 4.5]) cube([1, 1, 9], center=true);
    translate([23, 8, 4.5]) cube([1, 1, 9], center=true);
    translate([23, 9, 4.5]) cube([1, 1, 9], center=true);
    translate([23, 10, 4.5]) cube([1, 1, 9], center=true);
    translate([23, 11, 4.5]) cube([1, 1, 9], center=true);
    translate([23, 12, 4.5]) cube([1, 1, 9], center=true);
    translate([23, 13, 4.5]) cube([1, 1, 9], center=true);
    translate([23, 14, 4.5]) cube([1, 1, 9], center=true);
    translate([23, 15, 4.5]) cube([1, 1, 9], center=true);
    translate([23, 16, 4.5]) cube([1, 1, 9], center=true);
    translate([23, 17, 4.5]) cube([1, 1, 9], center=true);
    translate([23, 18, 4.5]) cube([1, 1, 9], center=true);
    translate([23, 19, 4.5]) cube([1, 1, 9], center=true);
    translate([23, 20, 4.5]) cube([1, 1, 9], center=true);
    translate([23, 21, 4.5]) cube([1, 1, 9], center=true);
    translate([23, 22, 4.5]) cube([1, 1, 9], center=true);
    translate([23, 23, 4.5]) cube([1, 1, 9], center=true);
    translate([23, 24, 4.5]) cube([1, 1, 9], center=true);
    translate([24, 0, 4.5]) cube([1, 1, 9], center=true);
    translate([24, 1, 4.5]) cube([1, 1, 9], center=true);
    translate([24, 2, 4.5]) cube([1, 1, 9], center=true);
    translate([24, 3, 4.5]) cube([1, 1, 9], center=true);
    translate([24, 4, 4.5]) cube([1, 1, 9], center=true);
    translate([24, 5, 4.5]) cube([1, 1, 9], center=true);
    translate([24, 6, 4.5]) cube([1, 1, 9], center=true);
    translate([24, 7, 4.5]) cube([1, 1, 9], center=true);
    translate([24, 8, 4.5]) cube([1, 1, 9], center=true);
    translate([24, 9, 4.5]) cube([1, 1, 9], center=true);
    translate([24, 10, 4.5]) cube([1, 1, 9], center=true);
    translate([24, 11, 4.5]) cube([1, 1, 9], center=true);
    translate([24, 12, 4.5]) cube([1, 1, 9], center=true);
    translate([24, 13, 4.5]) cube([1, 1, 9], center=true);
    translate([24, 14, 4.5]) cube([1, 1, 9], center=true);
    translate([24, 15, 4.5]) cube([1, 1, 9], center=true);
    translate([24, 16, 4.5]) cube([1, 1, 9], center=true);
    translate([24, 17, 4.5]) cube([1, 1, 9], center=true);
    translate([24, 18, 4.5]) cube([1, 1, 9], center=true);
    translate([24, 19, 4.5]) cube([1, 1, 9], center=true);
    translate([24, 20, 4.5]) cube([1, 1, 9], center=true);
    translate([24, 21, 4.5]) cube([1, 1, 9], center=true);
    translate([24, 22, 4.5]) cube([1, 1, 9], center=true);
    translate([24, 23, 4.5]) cube([1, 1, 9], center=true);
    translate([24, 24, 4.5]) cube([1, 1, 9], center=true);
}
